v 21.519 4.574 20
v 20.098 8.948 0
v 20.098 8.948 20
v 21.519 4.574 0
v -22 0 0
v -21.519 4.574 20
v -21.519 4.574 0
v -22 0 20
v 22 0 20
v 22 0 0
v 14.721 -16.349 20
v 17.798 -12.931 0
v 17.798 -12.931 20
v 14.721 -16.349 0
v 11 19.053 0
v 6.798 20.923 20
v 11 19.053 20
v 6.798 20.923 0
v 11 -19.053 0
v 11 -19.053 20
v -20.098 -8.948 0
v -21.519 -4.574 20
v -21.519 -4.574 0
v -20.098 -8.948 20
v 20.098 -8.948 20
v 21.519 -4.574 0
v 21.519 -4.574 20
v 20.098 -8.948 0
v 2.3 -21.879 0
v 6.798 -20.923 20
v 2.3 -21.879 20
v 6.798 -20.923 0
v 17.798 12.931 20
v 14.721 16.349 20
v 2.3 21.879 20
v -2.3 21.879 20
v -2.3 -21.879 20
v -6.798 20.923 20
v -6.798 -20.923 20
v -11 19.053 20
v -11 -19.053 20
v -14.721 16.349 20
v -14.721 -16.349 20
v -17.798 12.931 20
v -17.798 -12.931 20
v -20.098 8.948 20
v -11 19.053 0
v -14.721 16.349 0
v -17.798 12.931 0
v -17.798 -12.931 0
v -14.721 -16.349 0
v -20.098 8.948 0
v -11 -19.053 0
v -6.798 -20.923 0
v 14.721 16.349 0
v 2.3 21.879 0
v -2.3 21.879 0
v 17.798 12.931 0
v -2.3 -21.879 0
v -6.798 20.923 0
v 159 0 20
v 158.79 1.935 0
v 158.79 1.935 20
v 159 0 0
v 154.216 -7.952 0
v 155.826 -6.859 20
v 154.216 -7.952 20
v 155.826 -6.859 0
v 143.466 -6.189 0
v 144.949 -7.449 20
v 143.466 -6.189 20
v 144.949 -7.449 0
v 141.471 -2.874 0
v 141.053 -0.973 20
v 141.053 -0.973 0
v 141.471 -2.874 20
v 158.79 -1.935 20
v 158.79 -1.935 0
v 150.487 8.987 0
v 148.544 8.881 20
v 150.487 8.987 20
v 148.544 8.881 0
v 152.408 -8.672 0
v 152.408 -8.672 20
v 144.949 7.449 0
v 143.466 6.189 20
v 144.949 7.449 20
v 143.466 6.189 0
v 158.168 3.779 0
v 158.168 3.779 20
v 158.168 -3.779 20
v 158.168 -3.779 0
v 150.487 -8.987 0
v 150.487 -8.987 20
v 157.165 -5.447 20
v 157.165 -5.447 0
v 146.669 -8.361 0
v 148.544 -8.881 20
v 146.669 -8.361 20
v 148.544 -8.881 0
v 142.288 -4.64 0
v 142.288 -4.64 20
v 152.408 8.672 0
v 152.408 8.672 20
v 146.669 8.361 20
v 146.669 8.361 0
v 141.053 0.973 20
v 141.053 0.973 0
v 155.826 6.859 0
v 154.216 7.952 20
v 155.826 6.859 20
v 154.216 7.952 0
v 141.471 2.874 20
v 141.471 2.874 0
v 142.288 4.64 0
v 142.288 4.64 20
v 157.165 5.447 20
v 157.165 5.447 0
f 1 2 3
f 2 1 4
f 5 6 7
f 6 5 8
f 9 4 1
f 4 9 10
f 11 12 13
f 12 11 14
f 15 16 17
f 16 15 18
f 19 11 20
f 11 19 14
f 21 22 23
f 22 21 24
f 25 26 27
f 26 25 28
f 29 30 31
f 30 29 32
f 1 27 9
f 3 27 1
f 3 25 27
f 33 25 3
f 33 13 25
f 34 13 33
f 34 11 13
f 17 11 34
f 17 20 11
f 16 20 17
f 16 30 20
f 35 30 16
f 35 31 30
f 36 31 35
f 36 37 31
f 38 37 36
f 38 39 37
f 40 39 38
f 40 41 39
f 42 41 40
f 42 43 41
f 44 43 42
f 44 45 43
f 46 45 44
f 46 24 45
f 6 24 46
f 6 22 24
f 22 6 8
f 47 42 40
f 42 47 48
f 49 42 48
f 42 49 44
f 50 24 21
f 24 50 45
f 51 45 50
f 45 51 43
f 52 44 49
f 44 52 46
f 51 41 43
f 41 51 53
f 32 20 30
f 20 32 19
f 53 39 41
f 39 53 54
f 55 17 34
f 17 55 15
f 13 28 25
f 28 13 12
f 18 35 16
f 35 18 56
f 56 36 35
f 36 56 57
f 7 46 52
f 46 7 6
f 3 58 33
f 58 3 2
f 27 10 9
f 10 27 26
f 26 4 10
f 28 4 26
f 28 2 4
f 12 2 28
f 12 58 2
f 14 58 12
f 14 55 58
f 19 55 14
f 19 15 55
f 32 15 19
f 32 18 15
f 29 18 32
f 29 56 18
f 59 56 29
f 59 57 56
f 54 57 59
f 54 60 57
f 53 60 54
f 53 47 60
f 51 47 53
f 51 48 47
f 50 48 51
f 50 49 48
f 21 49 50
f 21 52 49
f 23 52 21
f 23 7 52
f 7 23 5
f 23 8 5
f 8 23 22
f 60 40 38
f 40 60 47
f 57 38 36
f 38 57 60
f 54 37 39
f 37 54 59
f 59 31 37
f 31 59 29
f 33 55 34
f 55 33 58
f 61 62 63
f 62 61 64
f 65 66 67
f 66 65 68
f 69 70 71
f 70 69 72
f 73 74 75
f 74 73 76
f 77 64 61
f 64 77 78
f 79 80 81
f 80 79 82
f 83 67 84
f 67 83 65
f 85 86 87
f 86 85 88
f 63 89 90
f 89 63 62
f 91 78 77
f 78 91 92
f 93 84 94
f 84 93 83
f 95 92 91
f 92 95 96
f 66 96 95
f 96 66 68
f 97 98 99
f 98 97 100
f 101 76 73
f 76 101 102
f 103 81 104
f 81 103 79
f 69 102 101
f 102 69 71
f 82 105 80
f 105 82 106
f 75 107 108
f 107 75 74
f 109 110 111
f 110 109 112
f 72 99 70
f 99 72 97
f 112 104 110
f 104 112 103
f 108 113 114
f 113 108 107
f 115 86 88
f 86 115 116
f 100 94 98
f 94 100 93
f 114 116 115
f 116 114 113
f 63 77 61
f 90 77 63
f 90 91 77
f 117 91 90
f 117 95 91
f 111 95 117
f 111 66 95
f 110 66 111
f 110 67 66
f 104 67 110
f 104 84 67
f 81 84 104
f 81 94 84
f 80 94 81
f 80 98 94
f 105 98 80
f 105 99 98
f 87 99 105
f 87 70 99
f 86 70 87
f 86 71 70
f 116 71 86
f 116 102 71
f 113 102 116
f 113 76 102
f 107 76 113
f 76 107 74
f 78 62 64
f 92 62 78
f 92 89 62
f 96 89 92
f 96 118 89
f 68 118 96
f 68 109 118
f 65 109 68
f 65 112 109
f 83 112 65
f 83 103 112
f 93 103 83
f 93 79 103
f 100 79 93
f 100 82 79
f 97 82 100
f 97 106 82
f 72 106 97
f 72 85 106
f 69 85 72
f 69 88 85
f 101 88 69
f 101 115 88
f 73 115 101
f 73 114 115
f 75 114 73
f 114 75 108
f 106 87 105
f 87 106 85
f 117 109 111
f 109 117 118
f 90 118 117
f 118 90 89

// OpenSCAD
module extrude_polyline(vertices, height) {
    linear_extrude(height = height) {
        polygon(points = vertices);
    }
}

module extrude_circle(center, radius, height) {
    translate(center) {
        linear_extrude(height = height) {
            circle(r = radius);
        }
    }
}

vertices1 = [
    [-3, -29.85, 0],
    [148.5, -14.925, 1.106],
    [148.5, 14.925, 0],
    [-3, 29.85, 0.905]
];

vertices2 = [
    [55, -4, 0],
    [95, -4, 1],
    [95, 4, 0],
    [55, 4, 1]
];

extrude_polyline(vertices1, 20);
extrude_circle([0, 0], 22, 20);
extrude_circle([150, 0], 9, 20);
extrude_polyline(vertices2, 20);
